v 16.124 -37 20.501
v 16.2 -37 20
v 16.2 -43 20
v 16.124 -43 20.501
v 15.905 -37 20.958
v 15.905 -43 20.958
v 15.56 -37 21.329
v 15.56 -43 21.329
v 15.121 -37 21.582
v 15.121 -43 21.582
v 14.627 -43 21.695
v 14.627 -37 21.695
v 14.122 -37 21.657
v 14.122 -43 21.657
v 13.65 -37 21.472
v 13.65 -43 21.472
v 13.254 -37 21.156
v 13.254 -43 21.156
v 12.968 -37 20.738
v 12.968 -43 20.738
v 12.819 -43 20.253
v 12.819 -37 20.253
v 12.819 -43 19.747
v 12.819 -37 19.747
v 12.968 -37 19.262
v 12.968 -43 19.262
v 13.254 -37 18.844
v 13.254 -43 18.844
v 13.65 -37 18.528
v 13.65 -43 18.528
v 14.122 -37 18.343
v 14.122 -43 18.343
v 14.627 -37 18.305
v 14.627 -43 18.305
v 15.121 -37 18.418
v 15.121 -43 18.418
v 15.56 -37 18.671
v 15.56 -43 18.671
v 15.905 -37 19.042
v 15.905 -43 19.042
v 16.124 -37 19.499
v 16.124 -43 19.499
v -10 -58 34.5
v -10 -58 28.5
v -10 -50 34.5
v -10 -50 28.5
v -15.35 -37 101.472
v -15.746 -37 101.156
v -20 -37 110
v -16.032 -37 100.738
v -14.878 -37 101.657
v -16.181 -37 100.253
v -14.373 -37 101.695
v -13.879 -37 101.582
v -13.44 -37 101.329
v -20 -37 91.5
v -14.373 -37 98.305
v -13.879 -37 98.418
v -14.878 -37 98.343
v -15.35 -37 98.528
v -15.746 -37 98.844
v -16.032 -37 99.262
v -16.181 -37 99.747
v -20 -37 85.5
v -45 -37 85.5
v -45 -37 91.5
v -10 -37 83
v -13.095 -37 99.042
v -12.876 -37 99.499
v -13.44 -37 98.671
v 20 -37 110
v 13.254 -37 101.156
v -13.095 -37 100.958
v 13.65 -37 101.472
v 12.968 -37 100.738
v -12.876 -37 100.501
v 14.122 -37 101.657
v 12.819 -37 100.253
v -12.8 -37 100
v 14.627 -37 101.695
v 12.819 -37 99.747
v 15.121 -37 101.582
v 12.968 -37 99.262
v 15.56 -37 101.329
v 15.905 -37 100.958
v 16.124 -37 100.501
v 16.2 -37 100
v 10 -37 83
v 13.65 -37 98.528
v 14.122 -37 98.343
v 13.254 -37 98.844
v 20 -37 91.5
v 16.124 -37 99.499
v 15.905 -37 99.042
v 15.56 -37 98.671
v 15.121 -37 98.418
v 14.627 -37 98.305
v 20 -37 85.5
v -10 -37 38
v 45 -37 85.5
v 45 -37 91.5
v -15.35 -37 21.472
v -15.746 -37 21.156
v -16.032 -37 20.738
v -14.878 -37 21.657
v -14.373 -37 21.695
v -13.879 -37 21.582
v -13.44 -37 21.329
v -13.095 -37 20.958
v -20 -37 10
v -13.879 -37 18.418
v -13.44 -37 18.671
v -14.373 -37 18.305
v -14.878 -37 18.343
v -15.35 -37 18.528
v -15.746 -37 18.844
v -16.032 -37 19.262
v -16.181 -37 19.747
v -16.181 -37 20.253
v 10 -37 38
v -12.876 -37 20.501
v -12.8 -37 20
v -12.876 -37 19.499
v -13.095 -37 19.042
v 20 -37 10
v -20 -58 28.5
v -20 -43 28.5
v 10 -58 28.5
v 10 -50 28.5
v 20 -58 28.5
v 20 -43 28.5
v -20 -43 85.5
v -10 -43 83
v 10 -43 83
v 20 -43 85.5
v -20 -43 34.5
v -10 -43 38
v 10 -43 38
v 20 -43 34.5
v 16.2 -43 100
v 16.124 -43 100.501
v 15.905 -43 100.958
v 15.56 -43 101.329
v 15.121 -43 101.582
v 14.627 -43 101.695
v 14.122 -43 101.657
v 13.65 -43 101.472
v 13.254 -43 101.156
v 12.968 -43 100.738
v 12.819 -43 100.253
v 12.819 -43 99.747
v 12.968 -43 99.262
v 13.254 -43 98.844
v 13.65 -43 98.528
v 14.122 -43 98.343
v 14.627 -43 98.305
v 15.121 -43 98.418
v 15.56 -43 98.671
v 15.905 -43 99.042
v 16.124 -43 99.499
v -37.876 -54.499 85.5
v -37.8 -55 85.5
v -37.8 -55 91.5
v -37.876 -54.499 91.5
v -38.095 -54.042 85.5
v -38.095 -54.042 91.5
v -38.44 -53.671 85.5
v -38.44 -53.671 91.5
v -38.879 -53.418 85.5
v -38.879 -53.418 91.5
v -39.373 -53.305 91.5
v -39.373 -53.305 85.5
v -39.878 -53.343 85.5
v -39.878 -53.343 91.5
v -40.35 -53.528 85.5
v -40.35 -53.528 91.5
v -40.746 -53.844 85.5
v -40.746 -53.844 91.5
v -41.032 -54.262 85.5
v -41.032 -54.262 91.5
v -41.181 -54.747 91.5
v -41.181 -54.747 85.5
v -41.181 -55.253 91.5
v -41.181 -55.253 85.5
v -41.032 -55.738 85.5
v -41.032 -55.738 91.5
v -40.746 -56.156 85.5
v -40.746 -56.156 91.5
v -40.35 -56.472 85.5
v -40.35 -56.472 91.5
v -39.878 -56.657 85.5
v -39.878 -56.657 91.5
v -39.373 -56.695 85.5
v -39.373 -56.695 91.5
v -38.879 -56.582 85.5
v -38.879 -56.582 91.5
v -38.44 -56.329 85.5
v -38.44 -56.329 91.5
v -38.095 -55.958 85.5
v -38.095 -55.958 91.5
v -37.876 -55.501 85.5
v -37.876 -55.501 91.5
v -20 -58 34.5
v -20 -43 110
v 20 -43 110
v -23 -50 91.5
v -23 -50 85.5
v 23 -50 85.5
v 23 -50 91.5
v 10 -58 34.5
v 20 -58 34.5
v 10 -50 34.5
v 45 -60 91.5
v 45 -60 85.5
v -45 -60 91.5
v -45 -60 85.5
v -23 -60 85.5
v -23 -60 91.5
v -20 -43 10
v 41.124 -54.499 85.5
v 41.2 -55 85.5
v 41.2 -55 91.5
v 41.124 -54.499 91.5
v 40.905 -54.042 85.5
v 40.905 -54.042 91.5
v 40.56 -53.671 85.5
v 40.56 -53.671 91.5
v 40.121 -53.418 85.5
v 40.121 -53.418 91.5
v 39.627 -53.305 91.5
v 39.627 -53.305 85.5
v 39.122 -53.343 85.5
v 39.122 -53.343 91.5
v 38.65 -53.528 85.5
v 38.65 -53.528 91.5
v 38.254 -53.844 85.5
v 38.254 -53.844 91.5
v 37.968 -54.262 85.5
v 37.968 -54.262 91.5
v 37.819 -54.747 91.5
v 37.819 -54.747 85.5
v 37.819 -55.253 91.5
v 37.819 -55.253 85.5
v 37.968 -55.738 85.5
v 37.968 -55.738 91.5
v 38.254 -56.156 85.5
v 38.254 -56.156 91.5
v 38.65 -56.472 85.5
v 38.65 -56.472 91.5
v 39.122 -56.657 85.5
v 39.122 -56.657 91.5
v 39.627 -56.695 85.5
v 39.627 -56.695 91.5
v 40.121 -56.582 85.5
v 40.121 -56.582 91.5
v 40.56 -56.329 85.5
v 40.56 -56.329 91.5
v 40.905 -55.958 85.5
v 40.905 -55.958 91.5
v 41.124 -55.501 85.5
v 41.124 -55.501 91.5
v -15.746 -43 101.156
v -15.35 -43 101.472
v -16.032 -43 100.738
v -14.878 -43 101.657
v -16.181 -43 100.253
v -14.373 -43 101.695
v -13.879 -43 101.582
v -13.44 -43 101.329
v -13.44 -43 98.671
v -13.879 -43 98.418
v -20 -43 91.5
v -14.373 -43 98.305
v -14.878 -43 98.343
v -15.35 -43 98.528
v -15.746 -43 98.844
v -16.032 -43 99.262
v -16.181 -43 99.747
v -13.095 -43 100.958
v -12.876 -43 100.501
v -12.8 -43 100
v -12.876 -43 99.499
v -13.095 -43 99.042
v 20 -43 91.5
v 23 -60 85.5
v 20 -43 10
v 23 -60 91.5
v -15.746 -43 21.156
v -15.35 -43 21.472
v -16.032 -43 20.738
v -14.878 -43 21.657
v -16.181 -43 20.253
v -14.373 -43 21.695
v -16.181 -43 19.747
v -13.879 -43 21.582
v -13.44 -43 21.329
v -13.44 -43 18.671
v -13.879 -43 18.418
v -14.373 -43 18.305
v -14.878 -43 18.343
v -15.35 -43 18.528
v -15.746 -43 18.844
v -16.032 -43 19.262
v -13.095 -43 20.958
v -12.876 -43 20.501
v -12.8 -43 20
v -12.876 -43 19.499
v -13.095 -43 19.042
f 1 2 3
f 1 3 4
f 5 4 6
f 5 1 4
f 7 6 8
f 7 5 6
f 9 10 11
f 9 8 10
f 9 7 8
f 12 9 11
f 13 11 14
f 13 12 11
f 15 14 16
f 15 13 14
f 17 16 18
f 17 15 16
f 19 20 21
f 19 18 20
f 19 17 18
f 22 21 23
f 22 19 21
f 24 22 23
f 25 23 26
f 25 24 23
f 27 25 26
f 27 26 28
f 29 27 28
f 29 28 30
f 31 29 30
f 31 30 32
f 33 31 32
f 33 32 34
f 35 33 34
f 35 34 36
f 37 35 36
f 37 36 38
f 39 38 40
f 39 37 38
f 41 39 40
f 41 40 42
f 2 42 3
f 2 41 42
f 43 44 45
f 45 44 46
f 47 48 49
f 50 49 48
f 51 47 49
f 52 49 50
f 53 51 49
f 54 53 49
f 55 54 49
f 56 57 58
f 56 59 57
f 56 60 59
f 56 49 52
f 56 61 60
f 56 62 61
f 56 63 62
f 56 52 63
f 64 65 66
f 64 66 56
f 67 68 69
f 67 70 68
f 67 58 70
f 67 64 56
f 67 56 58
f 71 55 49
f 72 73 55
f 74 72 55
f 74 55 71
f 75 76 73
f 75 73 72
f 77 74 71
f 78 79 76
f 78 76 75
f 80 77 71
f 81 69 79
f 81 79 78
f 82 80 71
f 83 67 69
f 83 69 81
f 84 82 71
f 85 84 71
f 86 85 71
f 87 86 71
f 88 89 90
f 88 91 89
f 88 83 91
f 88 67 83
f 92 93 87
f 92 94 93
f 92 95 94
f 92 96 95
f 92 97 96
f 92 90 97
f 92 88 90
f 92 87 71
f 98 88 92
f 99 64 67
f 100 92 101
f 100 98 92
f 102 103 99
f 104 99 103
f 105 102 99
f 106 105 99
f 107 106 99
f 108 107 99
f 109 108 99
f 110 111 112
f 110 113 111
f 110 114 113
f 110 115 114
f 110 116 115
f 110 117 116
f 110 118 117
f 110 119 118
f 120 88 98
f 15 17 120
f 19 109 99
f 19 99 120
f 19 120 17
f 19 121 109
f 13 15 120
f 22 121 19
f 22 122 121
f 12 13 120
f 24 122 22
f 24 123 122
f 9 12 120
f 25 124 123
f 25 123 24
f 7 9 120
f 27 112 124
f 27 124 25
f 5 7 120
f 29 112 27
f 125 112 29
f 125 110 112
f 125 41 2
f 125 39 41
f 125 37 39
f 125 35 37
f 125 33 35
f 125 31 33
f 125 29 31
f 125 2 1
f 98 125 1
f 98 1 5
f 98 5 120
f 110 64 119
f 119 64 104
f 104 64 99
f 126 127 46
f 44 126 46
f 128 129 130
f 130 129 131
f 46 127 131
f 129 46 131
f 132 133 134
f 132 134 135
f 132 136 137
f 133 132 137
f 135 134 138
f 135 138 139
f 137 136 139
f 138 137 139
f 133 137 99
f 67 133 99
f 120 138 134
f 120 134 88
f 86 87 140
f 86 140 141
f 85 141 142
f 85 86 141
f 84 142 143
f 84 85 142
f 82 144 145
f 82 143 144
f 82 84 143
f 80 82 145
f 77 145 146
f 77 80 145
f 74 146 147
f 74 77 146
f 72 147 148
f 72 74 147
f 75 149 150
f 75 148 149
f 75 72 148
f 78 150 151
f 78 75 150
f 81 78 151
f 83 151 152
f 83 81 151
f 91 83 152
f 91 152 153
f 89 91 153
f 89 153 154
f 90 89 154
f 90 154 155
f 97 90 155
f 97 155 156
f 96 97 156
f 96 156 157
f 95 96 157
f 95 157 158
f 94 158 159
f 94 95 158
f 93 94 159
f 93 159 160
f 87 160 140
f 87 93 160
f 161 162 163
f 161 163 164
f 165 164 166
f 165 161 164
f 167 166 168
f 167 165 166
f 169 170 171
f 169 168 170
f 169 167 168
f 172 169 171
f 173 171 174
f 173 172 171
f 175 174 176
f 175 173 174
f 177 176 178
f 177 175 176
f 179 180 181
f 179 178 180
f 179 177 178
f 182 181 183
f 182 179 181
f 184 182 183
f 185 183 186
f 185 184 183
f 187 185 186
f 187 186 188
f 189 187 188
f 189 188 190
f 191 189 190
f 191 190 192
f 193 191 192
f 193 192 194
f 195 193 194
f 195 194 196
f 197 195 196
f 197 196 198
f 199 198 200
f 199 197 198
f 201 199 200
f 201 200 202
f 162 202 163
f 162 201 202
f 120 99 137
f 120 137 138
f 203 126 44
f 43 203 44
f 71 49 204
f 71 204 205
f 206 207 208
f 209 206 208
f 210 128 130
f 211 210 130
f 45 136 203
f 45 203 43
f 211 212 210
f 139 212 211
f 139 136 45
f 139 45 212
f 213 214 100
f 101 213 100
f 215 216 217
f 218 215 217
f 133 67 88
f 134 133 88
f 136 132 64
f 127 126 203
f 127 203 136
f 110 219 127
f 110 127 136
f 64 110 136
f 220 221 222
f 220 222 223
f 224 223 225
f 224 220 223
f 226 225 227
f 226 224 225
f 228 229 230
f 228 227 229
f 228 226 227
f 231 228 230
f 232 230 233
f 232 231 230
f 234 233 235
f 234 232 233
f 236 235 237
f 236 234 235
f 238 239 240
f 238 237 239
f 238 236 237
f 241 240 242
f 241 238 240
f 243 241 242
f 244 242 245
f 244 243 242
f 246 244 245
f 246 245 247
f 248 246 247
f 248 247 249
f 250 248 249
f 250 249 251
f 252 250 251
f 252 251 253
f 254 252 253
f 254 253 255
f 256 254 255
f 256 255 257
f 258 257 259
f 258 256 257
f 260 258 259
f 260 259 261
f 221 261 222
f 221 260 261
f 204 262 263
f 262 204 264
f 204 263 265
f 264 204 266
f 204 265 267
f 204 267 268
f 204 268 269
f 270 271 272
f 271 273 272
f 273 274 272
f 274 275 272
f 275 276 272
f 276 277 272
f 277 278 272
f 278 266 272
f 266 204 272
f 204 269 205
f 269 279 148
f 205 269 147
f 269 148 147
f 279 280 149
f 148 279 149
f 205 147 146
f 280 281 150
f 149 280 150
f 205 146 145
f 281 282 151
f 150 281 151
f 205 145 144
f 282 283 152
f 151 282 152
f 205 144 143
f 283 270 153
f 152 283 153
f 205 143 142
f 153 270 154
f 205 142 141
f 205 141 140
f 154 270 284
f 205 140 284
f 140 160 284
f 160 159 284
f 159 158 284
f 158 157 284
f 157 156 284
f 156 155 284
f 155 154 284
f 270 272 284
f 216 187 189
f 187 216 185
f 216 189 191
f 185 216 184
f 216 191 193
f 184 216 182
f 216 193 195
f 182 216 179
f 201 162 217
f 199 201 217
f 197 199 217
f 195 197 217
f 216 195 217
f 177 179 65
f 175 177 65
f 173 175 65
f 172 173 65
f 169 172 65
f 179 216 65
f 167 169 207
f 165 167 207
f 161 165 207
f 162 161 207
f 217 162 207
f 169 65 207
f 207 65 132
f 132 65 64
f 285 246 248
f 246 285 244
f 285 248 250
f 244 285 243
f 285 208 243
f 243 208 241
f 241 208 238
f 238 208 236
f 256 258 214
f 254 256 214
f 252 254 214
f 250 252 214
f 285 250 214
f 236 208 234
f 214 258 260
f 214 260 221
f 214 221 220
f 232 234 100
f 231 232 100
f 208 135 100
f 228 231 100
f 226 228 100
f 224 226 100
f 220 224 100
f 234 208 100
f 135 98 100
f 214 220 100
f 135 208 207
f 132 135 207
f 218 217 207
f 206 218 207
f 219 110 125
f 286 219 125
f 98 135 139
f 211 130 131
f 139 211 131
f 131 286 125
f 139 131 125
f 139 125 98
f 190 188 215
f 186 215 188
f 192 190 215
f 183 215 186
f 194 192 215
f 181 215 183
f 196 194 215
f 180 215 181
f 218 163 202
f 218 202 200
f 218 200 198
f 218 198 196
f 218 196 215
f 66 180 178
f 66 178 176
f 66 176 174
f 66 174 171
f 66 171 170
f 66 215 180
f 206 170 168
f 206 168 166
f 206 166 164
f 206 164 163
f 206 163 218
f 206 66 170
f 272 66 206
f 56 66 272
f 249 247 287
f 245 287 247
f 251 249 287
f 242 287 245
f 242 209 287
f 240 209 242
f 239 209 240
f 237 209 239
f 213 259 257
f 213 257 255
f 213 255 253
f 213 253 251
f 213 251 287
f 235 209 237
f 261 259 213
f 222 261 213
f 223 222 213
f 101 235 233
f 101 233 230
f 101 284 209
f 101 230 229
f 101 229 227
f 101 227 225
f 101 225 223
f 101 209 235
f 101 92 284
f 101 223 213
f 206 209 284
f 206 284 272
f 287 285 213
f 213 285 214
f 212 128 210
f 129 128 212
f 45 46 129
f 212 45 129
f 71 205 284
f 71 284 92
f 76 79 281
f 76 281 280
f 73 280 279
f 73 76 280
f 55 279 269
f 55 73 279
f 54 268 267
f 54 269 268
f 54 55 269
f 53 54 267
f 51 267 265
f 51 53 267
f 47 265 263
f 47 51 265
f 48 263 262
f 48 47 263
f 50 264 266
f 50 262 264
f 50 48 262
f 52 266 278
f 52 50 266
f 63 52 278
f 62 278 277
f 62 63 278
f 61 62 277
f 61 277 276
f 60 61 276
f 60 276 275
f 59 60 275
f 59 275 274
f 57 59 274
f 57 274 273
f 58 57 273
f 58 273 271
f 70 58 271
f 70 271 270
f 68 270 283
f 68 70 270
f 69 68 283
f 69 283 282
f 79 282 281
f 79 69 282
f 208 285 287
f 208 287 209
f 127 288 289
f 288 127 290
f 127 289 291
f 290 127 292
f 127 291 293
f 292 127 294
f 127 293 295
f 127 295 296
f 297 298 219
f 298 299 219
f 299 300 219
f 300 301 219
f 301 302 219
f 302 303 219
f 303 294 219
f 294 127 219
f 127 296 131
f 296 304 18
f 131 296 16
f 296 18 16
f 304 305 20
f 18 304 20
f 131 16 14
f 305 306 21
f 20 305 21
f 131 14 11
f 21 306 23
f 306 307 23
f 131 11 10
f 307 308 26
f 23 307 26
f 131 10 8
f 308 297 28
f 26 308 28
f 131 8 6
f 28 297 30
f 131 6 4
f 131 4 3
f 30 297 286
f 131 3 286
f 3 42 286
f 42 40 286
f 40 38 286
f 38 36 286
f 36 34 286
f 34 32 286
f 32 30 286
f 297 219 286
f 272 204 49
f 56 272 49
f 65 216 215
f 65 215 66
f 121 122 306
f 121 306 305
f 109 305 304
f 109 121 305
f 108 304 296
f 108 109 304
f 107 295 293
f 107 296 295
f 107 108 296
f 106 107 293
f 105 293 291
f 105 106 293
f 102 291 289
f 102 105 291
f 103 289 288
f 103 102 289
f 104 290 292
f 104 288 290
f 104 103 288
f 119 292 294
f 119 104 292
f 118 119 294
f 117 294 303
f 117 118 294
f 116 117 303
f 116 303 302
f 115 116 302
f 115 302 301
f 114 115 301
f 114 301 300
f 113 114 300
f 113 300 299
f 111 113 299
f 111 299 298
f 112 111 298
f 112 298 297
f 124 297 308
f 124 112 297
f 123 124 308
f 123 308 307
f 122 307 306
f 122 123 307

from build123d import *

# Parameters (mm, degrees)
BOX028_W          = 20
BOX028_H          = 20
BOX028_DEPTH      = 45
BOX029_W          = 20
BOX029_H          = 20
BOX029_DEPTH      = 45
BOX030_W          = 46
BOX030_H          = 20
BOX030_DEPTH      = 45
CYLINDER030_R     = 1.7
CYLINDER030_DEPTH = 50
CYLINDER031_R     = 1.7
CYLINDER031_DEPTH = 50
CYLINDER032_R     = 1.7
CYLINDER032_DEPTH = 50
CYLINDER033_R     = 1.7
CYLINDER033_DEPTH = 50
CYLINDER034_R     = 1.7
CYLINDER034_DEPTH = 50
CYLINDER035_R     = 1.7
CYLINDER035_DEPTH = 50
BOX026_W          = 90
BOX026_H          = 23
BOX026_DEPTH      = 6
BOX025_W          = 40
BOX025_H          = 6
BOX025_DEPTH      = 100
BOX027_W          = 40
BOX027_H          = 15
BOX027_DEPTH      = 6


with BuildPart() as cube025:
    # Box028 → Box028 (new body)
    with BuildSketch(Plane(origin=(-10, -51, 38), x_dir=(1, 0, 0), z_dir=(0, 0, 1))):
        with Locations((10, 10)):
            Rectangle(BOX028_W, BOX028_H)
    extrude(amount=BOX028_DEPTH)


with BuildPart() as cube026:
    # Box029 → Box029 (new body)
    with BuildSketch(Plane(origin=(-10, -68, 20), x_dir=(1, 0, 0), z_dir=(0, 0, 1))):
        with Locations((10, 10)):
            Rectangle(BOX029_W, BOX029_H)
    extrude(amount=BOX029_DEPTH)


with BuildPart() as cube027:
    # Box030 → Box030 (new body)
    with BuildSketch(Plane(origin=(-23, -68, 56), x_dir=(1, 0, 0), z_dir=(0, 0, 1))):
        with Locations((23, 10)):
            Rectangle(BOX030_W, BOX030_H)
    extrude(amount=BOX030_DEPTH)


with BuildPart() as mounting_hole:
    # Cylinder030 → Cylinder030 (new body)
    with BuildSketch(Plane(origin=(-14.5, 0, 20), x_dir=(1, 0, 0), z_dir=(0, -1, 0))):
        Circle(CYLINDER030_R)
    extrude(amount=CYLINDER030_DEPTH)


with BuildPart() as mounting_hole001:
    # Cylinder031 → Cylinder031 (new body)
    with BuildSketch(Plane(origin=(14.5, 0, 20), x_dir=(1, 0, 0), z_dir=(0, -1, 0))):
        Circle(CYLINDER031_R)
    extrude(amount=CYLINDER031_DEPTH)


with BuildPart() as mounting_hole002:
    # Cylinder032 → Cylinder032 (new body)
    with BuildSketch(Plane(origin=(-14.5, 0, 100), x_dir=(1, 0, 0), z_dir=(0, -1, 0))):
        Circle(CYLINDER032_R)
    extrude(amount=CYLINDER032_DEPTH)


with BuildPart() as mounting_hole003:
    # Cylinder033 → Cylinder033 (new body)
    with BuildSketch(Plane(origin=(14.5, 0, 100), x_dir=(1, 0, 0), z_dir=(0, -1, 0))):
        Circle(CYLINDER033_R)
    extrude(amount=CYLINDER033_DEPTH)


with BuildPart() as mounting_hole004:
    # Cylinder034 → Cylinder034 (new body)
    with BuildSketch(Plane(origin=(-39.5, -53, 58), x_dir=(1, 0, 0), z_dir=(0, 0, 1))):
        Circle(CYLINDER034_R)
    extrude(amount=CYLINDER034_DEPTH)


with BuildPart() as mounting_hole005:
    # Cylinder035 → Cylinder035 (new body)
    with BuildSketch(Plane(origin=(39.5, -53, 58), x_dir=(1, 0, 0), z_dir=(0, 0, 1))):
        Circle(CYLINDER035_R)
    extrude(amount=CYLINDER035_DEPTH)


with BuildPart() as cube023:
    # Box026 → Box026 (new body)
    with BuildSketch(Plane(origin=(-45, -58, 85.5), x_dir=(1, 0, 0), z_dir=(0, 0, 1))):
        with Locations((45, 11.5)):
            Rectangle(BOX026_W, BOX026_H)
    extrude(amount=BOX026_DEPTH)


with BuildPart() as fusion024:
    # Box025 → Box025 (new body)
    with BuildSketch(Plane(origin=(-20, -41, 10), x_dir=(1, 0, 0), z_dir=(0, 0, 1))):
        with Locations((20, 3)):
            Rectangle(BOX025_W, BOX025_H)
    extrude(amount=BOX025_DEPTH)

    # Fusion024: union Cube023
    add(cube023.part)


with BuildPart() as paste_extruder_psu_mounting_bracket:
    # Box027 → Box027 (new body)
    with BuildSketch(Plane(origin=(-20, -56, 28.5), x_dir=(1, 0, 0), z_dir=(0, 0, 1))):
        with Locations((20, 7.5)):
            Rectangle(BOX027_W, BOX027_H)
    extrude(amount=BOX027_DEPTH)

    # Fusion025: union Fusion024
    add(fusion024.part)

    # Cut035: cut mounting hole005
    add(mounting_hole005.part, mode=Mode.SUBTRACT)

    # Cut036: cut mounting hole004
    add(mounting_hole004.part, mode=Mode.SUBTRACT)

    # Cut037: cut mounting hole003
    add(mounting_hole003.part, mode=Mode.SUBTRACT)

    # Cut038: cut mounting hole002
    add(mounting_hole002.part, mode=Mode.SUBTRACT)

    # Cut039: cut mounting hole001
    add(mounting_hole001.part, mode=Mode.SUBTRACT)

    # Cut040: cut mounting hole
    add(mounting_hole.part, mode=Mode.SUBTRACT)

    # Cut041: cut Cube027
    add(cube027.part, mode=Mode.SUBTRACT)

    # Cut042: cut Cube026
    add(cube026.part, mode=Mode.SUBTRACT)

    # Cut043: cut Cube025
    add(cube025.part, mode=Mode.SUBTRACT)


with BuildPart() as paste_extruder_psu_mounting_bracket_1:
    # Cut043 placement: moved
    add(paste_extruder_psu_mounting_bracket.part.moved(Location((0, -2, 0))))


solid = paste_extruder_psu_mounting_bracket_1.part
